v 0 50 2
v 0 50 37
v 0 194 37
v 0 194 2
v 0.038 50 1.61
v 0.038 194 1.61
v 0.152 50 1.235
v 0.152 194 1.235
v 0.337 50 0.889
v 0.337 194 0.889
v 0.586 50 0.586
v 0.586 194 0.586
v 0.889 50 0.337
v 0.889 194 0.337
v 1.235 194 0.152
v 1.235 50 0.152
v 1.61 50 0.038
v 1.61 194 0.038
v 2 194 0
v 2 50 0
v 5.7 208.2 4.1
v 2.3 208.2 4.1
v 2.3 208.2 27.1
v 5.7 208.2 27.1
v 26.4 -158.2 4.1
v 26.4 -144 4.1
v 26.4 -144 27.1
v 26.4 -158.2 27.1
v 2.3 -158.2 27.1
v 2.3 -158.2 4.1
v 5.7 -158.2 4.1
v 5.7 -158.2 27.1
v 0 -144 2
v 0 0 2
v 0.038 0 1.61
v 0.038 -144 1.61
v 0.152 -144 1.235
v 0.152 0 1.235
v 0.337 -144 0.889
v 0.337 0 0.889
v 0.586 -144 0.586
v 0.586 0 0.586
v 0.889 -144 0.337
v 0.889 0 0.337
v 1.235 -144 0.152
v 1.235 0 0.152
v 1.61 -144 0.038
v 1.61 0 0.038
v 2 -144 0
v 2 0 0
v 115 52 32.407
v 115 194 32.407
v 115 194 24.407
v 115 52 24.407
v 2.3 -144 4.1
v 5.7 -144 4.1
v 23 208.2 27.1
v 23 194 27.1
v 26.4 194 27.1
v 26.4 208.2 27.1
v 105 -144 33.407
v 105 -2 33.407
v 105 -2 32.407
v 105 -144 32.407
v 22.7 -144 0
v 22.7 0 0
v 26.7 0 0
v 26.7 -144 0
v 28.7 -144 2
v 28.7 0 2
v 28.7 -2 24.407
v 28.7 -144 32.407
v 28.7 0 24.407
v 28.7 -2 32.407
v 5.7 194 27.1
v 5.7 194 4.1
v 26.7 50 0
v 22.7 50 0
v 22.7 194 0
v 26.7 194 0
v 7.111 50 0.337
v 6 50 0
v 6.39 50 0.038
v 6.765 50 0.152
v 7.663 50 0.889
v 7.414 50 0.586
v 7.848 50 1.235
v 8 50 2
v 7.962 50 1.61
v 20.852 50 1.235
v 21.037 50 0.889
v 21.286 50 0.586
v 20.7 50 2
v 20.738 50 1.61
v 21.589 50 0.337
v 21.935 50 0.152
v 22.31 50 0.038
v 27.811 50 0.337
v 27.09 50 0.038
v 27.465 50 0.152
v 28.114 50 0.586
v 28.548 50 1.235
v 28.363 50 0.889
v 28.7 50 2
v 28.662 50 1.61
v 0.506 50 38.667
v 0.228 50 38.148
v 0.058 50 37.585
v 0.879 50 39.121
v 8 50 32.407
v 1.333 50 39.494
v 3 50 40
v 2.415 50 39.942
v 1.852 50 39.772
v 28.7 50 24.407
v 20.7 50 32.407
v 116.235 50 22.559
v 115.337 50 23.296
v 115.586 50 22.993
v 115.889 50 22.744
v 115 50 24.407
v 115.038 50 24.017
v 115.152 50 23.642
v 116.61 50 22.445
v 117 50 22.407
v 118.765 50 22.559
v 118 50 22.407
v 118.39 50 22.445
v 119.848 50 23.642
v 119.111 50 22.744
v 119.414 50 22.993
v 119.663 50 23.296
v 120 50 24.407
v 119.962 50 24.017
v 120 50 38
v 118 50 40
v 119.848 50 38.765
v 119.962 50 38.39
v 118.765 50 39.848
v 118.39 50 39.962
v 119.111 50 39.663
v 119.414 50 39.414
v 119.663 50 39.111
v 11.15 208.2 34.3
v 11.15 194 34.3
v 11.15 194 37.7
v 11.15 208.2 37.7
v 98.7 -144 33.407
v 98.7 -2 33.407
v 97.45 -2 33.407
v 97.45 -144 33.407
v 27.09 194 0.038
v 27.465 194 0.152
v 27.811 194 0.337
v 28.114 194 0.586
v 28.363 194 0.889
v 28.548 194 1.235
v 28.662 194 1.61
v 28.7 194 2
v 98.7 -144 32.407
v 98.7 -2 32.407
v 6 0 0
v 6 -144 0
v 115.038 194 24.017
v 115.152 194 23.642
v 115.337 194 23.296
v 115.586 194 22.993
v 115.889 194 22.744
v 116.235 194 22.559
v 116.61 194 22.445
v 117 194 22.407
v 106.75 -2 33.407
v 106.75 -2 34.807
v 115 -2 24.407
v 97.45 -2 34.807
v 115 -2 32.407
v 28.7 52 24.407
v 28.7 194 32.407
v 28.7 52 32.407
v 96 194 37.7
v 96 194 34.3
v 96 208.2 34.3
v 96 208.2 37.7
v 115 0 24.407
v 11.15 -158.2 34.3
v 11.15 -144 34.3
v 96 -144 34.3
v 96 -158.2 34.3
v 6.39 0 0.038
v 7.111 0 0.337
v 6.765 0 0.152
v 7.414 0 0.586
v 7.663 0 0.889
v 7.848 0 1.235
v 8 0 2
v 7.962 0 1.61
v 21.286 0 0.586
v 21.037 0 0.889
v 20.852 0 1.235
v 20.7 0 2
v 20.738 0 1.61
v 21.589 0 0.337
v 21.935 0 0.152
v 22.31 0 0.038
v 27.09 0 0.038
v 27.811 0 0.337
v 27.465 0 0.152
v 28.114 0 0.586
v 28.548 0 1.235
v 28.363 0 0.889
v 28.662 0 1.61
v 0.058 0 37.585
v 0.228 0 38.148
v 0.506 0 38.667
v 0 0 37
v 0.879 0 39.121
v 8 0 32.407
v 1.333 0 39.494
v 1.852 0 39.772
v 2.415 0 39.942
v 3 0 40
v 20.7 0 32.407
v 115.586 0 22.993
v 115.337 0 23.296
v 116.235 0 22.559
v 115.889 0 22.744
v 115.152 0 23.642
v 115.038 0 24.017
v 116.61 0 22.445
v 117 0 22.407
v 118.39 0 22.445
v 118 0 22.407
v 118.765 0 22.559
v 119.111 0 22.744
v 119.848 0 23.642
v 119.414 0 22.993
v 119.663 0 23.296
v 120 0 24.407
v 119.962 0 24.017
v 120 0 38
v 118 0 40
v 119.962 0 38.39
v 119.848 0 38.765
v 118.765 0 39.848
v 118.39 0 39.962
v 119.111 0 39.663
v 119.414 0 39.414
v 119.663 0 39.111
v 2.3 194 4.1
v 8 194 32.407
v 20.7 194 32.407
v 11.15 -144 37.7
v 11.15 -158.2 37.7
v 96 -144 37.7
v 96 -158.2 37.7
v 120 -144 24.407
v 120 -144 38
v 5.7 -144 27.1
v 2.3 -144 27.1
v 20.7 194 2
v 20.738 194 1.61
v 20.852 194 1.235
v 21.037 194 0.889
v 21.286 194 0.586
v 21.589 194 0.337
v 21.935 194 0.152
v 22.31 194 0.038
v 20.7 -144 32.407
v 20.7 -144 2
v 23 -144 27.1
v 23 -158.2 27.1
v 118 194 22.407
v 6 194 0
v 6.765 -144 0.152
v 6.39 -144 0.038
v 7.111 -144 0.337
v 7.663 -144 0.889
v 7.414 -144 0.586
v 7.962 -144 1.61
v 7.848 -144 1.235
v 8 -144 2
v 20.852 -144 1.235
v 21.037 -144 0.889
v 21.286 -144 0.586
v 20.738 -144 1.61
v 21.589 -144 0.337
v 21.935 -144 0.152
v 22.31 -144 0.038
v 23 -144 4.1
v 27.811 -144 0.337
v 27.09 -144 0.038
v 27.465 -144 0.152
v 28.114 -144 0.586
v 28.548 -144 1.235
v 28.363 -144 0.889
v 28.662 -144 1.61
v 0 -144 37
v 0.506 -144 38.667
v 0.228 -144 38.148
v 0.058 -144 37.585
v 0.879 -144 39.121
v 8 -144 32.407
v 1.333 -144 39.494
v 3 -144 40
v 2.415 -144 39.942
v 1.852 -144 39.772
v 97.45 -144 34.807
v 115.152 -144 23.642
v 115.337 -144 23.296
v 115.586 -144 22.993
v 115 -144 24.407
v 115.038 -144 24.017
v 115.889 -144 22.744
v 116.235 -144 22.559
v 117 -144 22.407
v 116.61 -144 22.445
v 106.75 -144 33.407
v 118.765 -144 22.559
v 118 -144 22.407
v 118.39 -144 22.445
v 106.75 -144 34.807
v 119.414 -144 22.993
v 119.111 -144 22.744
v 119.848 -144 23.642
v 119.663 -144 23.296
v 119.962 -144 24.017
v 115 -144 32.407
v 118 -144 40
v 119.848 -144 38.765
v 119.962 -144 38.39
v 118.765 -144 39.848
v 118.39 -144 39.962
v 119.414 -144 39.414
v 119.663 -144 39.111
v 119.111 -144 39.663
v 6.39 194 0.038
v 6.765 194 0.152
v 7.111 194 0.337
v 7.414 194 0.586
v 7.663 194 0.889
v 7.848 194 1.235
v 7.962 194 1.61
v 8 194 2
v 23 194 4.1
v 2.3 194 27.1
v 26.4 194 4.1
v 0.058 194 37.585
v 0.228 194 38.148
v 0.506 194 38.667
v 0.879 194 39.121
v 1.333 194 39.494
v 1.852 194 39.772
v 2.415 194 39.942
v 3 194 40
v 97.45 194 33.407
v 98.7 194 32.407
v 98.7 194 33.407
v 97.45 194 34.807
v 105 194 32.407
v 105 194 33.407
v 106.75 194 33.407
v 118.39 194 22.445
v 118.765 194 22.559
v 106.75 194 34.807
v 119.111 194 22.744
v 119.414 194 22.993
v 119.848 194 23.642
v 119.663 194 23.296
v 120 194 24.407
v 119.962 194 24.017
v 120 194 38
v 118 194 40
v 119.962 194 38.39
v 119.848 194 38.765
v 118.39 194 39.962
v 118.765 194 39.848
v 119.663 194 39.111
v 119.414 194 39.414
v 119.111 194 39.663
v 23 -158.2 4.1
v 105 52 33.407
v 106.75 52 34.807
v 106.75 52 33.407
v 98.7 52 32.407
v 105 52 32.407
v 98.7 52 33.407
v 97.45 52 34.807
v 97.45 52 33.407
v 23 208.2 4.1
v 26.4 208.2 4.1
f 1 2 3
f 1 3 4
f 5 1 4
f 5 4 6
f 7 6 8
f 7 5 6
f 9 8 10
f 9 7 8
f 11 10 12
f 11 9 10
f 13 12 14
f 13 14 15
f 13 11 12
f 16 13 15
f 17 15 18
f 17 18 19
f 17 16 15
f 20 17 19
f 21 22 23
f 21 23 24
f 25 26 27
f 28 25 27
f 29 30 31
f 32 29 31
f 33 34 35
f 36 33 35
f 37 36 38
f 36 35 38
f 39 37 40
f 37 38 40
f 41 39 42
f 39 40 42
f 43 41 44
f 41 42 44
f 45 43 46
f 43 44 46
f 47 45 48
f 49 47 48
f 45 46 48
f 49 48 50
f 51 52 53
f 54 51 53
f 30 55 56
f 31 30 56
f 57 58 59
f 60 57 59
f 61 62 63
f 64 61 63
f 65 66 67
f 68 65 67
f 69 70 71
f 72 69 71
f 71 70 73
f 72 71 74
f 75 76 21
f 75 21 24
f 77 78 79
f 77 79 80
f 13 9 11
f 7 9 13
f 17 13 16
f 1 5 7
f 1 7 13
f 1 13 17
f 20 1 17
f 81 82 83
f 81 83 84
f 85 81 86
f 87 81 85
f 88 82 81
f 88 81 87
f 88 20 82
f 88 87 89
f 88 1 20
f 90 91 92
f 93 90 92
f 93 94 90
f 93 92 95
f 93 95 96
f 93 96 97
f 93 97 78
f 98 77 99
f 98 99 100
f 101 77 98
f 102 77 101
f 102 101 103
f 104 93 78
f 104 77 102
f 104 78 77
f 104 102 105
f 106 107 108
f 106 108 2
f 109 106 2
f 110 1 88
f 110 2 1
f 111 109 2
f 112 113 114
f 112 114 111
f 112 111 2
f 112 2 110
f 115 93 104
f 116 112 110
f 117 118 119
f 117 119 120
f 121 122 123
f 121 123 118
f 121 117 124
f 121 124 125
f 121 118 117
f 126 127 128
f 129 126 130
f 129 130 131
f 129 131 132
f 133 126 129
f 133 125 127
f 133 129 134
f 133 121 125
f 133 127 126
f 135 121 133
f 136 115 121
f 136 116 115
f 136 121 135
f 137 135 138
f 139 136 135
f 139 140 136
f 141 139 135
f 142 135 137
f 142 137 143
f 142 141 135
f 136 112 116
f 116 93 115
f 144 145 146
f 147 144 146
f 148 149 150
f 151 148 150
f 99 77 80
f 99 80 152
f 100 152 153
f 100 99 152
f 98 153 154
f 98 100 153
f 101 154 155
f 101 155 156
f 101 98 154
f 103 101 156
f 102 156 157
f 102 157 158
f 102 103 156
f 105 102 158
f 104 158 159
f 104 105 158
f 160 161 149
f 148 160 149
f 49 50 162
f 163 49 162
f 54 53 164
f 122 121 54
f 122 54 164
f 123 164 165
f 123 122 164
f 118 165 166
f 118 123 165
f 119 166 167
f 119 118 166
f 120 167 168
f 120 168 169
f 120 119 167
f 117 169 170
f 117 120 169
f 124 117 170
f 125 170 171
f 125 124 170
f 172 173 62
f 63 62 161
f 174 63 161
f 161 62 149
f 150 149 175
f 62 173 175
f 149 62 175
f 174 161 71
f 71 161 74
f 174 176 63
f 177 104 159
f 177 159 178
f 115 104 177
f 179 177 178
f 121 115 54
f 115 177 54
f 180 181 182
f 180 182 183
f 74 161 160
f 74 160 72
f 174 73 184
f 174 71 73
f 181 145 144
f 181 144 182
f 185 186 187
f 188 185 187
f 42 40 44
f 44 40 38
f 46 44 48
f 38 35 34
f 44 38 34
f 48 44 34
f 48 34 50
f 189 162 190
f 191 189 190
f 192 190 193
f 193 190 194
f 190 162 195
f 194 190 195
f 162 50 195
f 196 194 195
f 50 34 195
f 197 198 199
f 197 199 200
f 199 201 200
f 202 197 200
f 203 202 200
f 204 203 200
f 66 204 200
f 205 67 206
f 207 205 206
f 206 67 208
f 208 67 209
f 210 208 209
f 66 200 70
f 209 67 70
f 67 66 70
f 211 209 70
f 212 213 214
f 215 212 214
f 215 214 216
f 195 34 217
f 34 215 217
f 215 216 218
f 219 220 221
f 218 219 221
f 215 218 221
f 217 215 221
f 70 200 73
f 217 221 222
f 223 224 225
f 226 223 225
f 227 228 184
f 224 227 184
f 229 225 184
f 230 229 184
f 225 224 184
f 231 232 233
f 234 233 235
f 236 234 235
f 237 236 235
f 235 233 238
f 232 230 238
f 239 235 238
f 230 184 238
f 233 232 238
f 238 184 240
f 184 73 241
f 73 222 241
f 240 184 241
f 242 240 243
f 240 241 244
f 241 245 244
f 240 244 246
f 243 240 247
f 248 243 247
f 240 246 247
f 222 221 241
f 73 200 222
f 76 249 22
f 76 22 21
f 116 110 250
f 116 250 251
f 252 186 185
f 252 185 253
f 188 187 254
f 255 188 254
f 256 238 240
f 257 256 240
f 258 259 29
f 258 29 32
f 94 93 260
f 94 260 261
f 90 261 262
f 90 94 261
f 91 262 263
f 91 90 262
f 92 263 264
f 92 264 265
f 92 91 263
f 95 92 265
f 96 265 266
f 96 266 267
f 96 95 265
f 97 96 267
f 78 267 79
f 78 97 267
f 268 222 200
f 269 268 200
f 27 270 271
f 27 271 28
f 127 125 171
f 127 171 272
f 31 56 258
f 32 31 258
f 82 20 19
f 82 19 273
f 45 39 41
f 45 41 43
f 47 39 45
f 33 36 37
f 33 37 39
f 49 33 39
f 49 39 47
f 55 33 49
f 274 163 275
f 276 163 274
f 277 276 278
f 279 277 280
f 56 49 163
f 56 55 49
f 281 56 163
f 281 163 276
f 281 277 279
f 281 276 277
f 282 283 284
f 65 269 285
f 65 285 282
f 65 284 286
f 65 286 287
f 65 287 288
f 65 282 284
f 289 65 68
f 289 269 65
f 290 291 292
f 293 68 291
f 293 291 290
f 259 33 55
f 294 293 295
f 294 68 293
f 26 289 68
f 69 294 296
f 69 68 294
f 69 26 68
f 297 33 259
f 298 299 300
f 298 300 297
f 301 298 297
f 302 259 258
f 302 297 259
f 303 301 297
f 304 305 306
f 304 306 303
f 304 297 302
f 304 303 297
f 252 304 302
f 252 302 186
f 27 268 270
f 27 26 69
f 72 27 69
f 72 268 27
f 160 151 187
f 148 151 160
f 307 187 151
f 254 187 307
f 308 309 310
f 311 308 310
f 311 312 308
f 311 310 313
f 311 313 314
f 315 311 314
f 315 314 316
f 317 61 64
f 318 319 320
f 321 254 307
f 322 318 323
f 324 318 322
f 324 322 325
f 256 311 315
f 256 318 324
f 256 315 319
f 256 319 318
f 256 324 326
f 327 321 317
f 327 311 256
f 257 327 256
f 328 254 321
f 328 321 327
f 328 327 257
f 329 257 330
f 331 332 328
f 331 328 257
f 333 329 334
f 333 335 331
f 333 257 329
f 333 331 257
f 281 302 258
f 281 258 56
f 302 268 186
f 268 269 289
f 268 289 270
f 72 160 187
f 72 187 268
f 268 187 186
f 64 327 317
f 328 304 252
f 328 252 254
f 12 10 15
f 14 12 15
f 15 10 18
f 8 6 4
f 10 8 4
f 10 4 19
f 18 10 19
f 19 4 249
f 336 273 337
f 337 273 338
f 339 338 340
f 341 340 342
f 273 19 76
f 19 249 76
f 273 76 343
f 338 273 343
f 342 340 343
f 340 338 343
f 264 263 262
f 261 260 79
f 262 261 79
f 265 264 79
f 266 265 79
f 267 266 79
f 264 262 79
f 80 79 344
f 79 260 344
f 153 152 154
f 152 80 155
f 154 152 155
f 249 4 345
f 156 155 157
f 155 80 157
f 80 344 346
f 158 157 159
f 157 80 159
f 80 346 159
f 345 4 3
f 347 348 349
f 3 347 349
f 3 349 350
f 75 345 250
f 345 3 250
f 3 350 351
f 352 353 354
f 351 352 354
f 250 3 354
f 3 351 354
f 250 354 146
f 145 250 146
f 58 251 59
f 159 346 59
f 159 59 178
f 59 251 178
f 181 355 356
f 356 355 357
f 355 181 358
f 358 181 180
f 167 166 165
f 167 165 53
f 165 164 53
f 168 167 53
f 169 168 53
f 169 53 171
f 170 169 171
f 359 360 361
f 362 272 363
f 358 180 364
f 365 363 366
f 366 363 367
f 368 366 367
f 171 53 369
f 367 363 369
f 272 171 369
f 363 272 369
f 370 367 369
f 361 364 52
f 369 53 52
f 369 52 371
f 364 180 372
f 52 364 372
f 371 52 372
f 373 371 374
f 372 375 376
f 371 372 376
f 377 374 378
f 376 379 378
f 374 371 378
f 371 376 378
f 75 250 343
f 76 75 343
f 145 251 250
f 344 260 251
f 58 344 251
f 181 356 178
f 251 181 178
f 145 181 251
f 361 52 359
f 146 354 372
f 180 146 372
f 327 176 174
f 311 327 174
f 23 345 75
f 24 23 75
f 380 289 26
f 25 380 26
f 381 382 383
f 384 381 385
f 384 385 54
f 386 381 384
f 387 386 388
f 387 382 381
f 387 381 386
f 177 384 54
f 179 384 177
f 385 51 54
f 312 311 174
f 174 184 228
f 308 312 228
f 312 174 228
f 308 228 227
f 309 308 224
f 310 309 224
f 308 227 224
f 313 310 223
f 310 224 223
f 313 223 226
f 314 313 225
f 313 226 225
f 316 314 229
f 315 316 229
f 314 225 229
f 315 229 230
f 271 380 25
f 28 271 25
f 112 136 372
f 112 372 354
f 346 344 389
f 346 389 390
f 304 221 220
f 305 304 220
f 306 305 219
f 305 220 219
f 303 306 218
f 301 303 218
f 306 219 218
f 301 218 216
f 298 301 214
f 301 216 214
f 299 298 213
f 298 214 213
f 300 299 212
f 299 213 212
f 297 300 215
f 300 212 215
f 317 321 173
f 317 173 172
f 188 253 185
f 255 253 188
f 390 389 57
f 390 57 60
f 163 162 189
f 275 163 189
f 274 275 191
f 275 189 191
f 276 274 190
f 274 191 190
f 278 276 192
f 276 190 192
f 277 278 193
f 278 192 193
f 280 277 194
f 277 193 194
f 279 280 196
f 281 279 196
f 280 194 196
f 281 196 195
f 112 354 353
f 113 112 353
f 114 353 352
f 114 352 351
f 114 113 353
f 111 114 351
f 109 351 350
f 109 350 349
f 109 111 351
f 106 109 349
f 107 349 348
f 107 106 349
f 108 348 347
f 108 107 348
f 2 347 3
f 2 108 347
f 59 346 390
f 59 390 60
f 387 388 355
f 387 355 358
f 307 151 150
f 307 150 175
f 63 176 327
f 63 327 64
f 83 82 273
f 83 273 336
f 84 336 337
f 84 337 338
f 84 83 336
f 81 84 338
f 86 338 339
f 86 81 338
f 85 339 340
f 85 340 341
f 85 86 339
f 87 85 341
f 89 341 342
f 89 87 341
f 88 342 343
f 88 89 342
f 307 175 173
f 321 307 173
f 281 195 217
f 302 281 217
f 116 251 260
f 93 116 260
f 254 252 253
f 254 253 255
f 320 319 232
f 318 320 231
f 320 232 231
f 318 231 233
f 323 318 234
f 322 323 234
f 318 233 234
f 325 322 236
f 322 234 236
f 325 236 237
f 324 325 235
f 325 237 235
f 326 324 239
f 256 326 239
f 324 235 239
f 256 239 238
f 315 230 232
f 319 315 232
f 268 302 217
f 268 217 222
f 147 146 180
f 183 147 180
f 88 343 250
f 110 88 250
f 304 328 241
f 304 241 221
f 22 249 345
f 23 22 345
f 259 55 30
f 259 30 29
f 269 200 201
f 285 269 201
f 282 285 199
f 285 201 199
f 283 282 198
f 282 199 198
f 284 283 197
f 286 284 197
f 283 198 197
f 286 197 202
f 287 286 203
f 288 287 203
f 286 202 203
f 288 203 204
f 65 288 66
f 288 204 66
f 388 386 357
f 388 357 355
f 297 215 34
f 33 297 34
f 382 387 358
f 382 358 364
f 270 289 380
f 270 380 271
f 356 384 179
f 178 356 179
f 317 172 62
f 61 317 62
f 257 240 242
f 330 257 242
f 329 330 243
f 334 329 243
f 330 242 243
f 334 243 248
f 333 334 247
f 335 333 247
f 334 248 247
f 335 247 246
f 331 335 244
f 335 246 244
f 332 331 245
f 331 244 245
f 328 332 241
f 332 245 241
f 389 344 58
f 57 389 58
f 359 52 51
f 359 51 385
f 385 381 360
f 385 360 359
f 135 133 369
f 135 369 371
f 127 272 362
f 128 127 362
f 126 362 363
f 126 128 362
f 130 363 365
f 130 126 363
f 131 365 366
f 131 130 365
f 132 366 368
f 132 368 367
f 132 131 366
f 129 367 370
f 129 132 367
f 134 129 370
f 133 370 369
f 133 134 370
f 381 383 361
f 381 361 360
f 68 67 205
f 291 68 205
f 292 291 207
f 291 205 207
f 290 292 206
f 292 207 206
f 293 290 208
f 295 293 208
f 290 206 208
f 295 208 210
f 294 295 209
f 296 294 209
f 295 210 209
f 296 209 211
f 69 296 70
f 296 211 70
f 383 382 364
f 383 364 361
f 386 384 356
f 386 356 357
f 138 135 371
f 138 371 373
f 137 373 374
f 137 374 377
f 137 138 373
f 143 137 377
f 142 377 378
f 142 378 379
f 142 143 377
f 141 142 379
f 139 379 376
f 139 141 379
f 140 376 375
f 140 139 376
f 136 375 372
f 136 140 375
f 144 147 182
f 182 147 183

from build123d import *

# Parameters (mm, degrees)
F1_DEPTH = 144
F2_W     = 84.85
F2_H     = 3.4
F2_W_2   = 3.4
F2_H_2   = 23
F3_DEPTH = 14.2
F5_DEPTH = 2
F7_DEPTH = 8


with BuildPart() as f1:
    # F0 (on Front) → F1 (new body)
    with BuildSketch(Plane.XZ):
        with BuildLine():
            Line((0, 37), (0, 2))
            ThreePointArc((0, 2), (0.5857864376, 0.5857864376), (2, 0))
            Line((2, 0), (6, 0))
            ThreePointArc((6, 0), (7.4142135624, 0.5857864376), (8, 2))
            Line((8, 2), (8, 32.406905199))
            Line((8, 32.406905199), (20.7, 32.406905199))
            Line((20.7, 32.406905199), (20.7, 2))
            ThreePointArc((20.7, 2), (21.2857864376, 0.5857864376), (22.7, 0))
            Line((22.7, 0), (26.7, 0))
            ThreePointArc((26.7, 0), (28.1142135624, 0.5857864376), (28.7, 2))
            Line((28.7, 2), (28.7, 32.406905199))
            Line((28.7, 32.406905199), (98.7, 32.406905199))
            Line((98.7, 32.406905199), (98.7, 33.406905199))
            Line((98.7, 33.406905199), (97.45, 33.406905199))
            Line((97.45, 33.406905199), (97.45, 34.806905199))
            Line((97.45, 34.806905199), (106.75, 34.806905199))
            Line((106.75, 34.806905199), (106.75, 33.406905199))
            Line((106.75, 33.406905199), (105, 33.406905199))
            Line((105, 33.406905199), (105, 32.406905199))
            Line((105, 32.406905199), (115, 32.406905199))
            Line((115, 32.406905199), (120, 32.406905199))
            Line((120, 32.406905199), (120, 38))
            ThreePointArc((120, 38), (119.4142135624, 39.4142135624), (118, 40))
            Line((118, 40), (3, 40))
            ThreePointArc((3, 40), (0.8786796564, 39.1213203436), (0, 37))
        make_face()
        with BuildLine():
            Line((120, 24.406905199), (120, 32.406905199))
            Line((120, 32.406905199), (115, 32.406905199))
            Line((115, 32.406905199), (115, 24.406905199))
            ThreePointArc((115, 24.406905199), (115.5857864376, 22.9926916366), (117, 22.406905199))
            Line((117, 22.406905199), (118, 22.406905199))
            ThreePointArc((118, 22.406905199), (119.4142135624, 22.9926916366), (120, 24.406905199))
        make_face()
    extrude(amount=F1_DEPTH)

    # F2 (on face) → F3 (join)
    with BuildSketch(Plane.XZ.offset(144)):
        with Locations((53.575, 36)):
            Rectangle(F2_W, F2_H)
        with Locations((4, 15.6)):
            Rectangle(F2_W_2, F2_H_2)
        with Locations((24.7, 15.6)):
            Rectangle(F2_W_2, F2_H_2)
    extrude(amount=F3_DEPTH)

    # F4 (on face) → F5 (join)
    with BuildSketch(Plane(origin=(0, 0, 0), x_dir=(-1, 0, 0), z_dir=(0, 1, 0))):
        Polygon((-105, 33.406905199), (-105, 32.406905199), (-98.7, 32.406905199), (-98.7, 33.406905199), (-97.45, 33.406905199), (-97.45, 34.806905199), (-106.75, 34.806905199), (-106.75, 33.406905199), align=None)
    extrude(amount=-F5_DEPTH)

    # F6 (on face) → F7 (join, through all)
    with BuildSketch(Plane(origin=(0, 0, 32.406905199), x_dir=(1, 0, 0), z_dir=(0, 0, -1))):
        Polygon((28.7, 0), (115, 0), (115, 2), (105, 2), (98.7, 2), (28.7, 2), align=None)
    extrude(amount=F7_DEPTH)


with BuildPart() as f9_1:
    # F9: instance of F1
    add(f1.part.mirror(Plane.XZ.offset(-25)))


solid = Compound([f1.part, f9_1.part])
